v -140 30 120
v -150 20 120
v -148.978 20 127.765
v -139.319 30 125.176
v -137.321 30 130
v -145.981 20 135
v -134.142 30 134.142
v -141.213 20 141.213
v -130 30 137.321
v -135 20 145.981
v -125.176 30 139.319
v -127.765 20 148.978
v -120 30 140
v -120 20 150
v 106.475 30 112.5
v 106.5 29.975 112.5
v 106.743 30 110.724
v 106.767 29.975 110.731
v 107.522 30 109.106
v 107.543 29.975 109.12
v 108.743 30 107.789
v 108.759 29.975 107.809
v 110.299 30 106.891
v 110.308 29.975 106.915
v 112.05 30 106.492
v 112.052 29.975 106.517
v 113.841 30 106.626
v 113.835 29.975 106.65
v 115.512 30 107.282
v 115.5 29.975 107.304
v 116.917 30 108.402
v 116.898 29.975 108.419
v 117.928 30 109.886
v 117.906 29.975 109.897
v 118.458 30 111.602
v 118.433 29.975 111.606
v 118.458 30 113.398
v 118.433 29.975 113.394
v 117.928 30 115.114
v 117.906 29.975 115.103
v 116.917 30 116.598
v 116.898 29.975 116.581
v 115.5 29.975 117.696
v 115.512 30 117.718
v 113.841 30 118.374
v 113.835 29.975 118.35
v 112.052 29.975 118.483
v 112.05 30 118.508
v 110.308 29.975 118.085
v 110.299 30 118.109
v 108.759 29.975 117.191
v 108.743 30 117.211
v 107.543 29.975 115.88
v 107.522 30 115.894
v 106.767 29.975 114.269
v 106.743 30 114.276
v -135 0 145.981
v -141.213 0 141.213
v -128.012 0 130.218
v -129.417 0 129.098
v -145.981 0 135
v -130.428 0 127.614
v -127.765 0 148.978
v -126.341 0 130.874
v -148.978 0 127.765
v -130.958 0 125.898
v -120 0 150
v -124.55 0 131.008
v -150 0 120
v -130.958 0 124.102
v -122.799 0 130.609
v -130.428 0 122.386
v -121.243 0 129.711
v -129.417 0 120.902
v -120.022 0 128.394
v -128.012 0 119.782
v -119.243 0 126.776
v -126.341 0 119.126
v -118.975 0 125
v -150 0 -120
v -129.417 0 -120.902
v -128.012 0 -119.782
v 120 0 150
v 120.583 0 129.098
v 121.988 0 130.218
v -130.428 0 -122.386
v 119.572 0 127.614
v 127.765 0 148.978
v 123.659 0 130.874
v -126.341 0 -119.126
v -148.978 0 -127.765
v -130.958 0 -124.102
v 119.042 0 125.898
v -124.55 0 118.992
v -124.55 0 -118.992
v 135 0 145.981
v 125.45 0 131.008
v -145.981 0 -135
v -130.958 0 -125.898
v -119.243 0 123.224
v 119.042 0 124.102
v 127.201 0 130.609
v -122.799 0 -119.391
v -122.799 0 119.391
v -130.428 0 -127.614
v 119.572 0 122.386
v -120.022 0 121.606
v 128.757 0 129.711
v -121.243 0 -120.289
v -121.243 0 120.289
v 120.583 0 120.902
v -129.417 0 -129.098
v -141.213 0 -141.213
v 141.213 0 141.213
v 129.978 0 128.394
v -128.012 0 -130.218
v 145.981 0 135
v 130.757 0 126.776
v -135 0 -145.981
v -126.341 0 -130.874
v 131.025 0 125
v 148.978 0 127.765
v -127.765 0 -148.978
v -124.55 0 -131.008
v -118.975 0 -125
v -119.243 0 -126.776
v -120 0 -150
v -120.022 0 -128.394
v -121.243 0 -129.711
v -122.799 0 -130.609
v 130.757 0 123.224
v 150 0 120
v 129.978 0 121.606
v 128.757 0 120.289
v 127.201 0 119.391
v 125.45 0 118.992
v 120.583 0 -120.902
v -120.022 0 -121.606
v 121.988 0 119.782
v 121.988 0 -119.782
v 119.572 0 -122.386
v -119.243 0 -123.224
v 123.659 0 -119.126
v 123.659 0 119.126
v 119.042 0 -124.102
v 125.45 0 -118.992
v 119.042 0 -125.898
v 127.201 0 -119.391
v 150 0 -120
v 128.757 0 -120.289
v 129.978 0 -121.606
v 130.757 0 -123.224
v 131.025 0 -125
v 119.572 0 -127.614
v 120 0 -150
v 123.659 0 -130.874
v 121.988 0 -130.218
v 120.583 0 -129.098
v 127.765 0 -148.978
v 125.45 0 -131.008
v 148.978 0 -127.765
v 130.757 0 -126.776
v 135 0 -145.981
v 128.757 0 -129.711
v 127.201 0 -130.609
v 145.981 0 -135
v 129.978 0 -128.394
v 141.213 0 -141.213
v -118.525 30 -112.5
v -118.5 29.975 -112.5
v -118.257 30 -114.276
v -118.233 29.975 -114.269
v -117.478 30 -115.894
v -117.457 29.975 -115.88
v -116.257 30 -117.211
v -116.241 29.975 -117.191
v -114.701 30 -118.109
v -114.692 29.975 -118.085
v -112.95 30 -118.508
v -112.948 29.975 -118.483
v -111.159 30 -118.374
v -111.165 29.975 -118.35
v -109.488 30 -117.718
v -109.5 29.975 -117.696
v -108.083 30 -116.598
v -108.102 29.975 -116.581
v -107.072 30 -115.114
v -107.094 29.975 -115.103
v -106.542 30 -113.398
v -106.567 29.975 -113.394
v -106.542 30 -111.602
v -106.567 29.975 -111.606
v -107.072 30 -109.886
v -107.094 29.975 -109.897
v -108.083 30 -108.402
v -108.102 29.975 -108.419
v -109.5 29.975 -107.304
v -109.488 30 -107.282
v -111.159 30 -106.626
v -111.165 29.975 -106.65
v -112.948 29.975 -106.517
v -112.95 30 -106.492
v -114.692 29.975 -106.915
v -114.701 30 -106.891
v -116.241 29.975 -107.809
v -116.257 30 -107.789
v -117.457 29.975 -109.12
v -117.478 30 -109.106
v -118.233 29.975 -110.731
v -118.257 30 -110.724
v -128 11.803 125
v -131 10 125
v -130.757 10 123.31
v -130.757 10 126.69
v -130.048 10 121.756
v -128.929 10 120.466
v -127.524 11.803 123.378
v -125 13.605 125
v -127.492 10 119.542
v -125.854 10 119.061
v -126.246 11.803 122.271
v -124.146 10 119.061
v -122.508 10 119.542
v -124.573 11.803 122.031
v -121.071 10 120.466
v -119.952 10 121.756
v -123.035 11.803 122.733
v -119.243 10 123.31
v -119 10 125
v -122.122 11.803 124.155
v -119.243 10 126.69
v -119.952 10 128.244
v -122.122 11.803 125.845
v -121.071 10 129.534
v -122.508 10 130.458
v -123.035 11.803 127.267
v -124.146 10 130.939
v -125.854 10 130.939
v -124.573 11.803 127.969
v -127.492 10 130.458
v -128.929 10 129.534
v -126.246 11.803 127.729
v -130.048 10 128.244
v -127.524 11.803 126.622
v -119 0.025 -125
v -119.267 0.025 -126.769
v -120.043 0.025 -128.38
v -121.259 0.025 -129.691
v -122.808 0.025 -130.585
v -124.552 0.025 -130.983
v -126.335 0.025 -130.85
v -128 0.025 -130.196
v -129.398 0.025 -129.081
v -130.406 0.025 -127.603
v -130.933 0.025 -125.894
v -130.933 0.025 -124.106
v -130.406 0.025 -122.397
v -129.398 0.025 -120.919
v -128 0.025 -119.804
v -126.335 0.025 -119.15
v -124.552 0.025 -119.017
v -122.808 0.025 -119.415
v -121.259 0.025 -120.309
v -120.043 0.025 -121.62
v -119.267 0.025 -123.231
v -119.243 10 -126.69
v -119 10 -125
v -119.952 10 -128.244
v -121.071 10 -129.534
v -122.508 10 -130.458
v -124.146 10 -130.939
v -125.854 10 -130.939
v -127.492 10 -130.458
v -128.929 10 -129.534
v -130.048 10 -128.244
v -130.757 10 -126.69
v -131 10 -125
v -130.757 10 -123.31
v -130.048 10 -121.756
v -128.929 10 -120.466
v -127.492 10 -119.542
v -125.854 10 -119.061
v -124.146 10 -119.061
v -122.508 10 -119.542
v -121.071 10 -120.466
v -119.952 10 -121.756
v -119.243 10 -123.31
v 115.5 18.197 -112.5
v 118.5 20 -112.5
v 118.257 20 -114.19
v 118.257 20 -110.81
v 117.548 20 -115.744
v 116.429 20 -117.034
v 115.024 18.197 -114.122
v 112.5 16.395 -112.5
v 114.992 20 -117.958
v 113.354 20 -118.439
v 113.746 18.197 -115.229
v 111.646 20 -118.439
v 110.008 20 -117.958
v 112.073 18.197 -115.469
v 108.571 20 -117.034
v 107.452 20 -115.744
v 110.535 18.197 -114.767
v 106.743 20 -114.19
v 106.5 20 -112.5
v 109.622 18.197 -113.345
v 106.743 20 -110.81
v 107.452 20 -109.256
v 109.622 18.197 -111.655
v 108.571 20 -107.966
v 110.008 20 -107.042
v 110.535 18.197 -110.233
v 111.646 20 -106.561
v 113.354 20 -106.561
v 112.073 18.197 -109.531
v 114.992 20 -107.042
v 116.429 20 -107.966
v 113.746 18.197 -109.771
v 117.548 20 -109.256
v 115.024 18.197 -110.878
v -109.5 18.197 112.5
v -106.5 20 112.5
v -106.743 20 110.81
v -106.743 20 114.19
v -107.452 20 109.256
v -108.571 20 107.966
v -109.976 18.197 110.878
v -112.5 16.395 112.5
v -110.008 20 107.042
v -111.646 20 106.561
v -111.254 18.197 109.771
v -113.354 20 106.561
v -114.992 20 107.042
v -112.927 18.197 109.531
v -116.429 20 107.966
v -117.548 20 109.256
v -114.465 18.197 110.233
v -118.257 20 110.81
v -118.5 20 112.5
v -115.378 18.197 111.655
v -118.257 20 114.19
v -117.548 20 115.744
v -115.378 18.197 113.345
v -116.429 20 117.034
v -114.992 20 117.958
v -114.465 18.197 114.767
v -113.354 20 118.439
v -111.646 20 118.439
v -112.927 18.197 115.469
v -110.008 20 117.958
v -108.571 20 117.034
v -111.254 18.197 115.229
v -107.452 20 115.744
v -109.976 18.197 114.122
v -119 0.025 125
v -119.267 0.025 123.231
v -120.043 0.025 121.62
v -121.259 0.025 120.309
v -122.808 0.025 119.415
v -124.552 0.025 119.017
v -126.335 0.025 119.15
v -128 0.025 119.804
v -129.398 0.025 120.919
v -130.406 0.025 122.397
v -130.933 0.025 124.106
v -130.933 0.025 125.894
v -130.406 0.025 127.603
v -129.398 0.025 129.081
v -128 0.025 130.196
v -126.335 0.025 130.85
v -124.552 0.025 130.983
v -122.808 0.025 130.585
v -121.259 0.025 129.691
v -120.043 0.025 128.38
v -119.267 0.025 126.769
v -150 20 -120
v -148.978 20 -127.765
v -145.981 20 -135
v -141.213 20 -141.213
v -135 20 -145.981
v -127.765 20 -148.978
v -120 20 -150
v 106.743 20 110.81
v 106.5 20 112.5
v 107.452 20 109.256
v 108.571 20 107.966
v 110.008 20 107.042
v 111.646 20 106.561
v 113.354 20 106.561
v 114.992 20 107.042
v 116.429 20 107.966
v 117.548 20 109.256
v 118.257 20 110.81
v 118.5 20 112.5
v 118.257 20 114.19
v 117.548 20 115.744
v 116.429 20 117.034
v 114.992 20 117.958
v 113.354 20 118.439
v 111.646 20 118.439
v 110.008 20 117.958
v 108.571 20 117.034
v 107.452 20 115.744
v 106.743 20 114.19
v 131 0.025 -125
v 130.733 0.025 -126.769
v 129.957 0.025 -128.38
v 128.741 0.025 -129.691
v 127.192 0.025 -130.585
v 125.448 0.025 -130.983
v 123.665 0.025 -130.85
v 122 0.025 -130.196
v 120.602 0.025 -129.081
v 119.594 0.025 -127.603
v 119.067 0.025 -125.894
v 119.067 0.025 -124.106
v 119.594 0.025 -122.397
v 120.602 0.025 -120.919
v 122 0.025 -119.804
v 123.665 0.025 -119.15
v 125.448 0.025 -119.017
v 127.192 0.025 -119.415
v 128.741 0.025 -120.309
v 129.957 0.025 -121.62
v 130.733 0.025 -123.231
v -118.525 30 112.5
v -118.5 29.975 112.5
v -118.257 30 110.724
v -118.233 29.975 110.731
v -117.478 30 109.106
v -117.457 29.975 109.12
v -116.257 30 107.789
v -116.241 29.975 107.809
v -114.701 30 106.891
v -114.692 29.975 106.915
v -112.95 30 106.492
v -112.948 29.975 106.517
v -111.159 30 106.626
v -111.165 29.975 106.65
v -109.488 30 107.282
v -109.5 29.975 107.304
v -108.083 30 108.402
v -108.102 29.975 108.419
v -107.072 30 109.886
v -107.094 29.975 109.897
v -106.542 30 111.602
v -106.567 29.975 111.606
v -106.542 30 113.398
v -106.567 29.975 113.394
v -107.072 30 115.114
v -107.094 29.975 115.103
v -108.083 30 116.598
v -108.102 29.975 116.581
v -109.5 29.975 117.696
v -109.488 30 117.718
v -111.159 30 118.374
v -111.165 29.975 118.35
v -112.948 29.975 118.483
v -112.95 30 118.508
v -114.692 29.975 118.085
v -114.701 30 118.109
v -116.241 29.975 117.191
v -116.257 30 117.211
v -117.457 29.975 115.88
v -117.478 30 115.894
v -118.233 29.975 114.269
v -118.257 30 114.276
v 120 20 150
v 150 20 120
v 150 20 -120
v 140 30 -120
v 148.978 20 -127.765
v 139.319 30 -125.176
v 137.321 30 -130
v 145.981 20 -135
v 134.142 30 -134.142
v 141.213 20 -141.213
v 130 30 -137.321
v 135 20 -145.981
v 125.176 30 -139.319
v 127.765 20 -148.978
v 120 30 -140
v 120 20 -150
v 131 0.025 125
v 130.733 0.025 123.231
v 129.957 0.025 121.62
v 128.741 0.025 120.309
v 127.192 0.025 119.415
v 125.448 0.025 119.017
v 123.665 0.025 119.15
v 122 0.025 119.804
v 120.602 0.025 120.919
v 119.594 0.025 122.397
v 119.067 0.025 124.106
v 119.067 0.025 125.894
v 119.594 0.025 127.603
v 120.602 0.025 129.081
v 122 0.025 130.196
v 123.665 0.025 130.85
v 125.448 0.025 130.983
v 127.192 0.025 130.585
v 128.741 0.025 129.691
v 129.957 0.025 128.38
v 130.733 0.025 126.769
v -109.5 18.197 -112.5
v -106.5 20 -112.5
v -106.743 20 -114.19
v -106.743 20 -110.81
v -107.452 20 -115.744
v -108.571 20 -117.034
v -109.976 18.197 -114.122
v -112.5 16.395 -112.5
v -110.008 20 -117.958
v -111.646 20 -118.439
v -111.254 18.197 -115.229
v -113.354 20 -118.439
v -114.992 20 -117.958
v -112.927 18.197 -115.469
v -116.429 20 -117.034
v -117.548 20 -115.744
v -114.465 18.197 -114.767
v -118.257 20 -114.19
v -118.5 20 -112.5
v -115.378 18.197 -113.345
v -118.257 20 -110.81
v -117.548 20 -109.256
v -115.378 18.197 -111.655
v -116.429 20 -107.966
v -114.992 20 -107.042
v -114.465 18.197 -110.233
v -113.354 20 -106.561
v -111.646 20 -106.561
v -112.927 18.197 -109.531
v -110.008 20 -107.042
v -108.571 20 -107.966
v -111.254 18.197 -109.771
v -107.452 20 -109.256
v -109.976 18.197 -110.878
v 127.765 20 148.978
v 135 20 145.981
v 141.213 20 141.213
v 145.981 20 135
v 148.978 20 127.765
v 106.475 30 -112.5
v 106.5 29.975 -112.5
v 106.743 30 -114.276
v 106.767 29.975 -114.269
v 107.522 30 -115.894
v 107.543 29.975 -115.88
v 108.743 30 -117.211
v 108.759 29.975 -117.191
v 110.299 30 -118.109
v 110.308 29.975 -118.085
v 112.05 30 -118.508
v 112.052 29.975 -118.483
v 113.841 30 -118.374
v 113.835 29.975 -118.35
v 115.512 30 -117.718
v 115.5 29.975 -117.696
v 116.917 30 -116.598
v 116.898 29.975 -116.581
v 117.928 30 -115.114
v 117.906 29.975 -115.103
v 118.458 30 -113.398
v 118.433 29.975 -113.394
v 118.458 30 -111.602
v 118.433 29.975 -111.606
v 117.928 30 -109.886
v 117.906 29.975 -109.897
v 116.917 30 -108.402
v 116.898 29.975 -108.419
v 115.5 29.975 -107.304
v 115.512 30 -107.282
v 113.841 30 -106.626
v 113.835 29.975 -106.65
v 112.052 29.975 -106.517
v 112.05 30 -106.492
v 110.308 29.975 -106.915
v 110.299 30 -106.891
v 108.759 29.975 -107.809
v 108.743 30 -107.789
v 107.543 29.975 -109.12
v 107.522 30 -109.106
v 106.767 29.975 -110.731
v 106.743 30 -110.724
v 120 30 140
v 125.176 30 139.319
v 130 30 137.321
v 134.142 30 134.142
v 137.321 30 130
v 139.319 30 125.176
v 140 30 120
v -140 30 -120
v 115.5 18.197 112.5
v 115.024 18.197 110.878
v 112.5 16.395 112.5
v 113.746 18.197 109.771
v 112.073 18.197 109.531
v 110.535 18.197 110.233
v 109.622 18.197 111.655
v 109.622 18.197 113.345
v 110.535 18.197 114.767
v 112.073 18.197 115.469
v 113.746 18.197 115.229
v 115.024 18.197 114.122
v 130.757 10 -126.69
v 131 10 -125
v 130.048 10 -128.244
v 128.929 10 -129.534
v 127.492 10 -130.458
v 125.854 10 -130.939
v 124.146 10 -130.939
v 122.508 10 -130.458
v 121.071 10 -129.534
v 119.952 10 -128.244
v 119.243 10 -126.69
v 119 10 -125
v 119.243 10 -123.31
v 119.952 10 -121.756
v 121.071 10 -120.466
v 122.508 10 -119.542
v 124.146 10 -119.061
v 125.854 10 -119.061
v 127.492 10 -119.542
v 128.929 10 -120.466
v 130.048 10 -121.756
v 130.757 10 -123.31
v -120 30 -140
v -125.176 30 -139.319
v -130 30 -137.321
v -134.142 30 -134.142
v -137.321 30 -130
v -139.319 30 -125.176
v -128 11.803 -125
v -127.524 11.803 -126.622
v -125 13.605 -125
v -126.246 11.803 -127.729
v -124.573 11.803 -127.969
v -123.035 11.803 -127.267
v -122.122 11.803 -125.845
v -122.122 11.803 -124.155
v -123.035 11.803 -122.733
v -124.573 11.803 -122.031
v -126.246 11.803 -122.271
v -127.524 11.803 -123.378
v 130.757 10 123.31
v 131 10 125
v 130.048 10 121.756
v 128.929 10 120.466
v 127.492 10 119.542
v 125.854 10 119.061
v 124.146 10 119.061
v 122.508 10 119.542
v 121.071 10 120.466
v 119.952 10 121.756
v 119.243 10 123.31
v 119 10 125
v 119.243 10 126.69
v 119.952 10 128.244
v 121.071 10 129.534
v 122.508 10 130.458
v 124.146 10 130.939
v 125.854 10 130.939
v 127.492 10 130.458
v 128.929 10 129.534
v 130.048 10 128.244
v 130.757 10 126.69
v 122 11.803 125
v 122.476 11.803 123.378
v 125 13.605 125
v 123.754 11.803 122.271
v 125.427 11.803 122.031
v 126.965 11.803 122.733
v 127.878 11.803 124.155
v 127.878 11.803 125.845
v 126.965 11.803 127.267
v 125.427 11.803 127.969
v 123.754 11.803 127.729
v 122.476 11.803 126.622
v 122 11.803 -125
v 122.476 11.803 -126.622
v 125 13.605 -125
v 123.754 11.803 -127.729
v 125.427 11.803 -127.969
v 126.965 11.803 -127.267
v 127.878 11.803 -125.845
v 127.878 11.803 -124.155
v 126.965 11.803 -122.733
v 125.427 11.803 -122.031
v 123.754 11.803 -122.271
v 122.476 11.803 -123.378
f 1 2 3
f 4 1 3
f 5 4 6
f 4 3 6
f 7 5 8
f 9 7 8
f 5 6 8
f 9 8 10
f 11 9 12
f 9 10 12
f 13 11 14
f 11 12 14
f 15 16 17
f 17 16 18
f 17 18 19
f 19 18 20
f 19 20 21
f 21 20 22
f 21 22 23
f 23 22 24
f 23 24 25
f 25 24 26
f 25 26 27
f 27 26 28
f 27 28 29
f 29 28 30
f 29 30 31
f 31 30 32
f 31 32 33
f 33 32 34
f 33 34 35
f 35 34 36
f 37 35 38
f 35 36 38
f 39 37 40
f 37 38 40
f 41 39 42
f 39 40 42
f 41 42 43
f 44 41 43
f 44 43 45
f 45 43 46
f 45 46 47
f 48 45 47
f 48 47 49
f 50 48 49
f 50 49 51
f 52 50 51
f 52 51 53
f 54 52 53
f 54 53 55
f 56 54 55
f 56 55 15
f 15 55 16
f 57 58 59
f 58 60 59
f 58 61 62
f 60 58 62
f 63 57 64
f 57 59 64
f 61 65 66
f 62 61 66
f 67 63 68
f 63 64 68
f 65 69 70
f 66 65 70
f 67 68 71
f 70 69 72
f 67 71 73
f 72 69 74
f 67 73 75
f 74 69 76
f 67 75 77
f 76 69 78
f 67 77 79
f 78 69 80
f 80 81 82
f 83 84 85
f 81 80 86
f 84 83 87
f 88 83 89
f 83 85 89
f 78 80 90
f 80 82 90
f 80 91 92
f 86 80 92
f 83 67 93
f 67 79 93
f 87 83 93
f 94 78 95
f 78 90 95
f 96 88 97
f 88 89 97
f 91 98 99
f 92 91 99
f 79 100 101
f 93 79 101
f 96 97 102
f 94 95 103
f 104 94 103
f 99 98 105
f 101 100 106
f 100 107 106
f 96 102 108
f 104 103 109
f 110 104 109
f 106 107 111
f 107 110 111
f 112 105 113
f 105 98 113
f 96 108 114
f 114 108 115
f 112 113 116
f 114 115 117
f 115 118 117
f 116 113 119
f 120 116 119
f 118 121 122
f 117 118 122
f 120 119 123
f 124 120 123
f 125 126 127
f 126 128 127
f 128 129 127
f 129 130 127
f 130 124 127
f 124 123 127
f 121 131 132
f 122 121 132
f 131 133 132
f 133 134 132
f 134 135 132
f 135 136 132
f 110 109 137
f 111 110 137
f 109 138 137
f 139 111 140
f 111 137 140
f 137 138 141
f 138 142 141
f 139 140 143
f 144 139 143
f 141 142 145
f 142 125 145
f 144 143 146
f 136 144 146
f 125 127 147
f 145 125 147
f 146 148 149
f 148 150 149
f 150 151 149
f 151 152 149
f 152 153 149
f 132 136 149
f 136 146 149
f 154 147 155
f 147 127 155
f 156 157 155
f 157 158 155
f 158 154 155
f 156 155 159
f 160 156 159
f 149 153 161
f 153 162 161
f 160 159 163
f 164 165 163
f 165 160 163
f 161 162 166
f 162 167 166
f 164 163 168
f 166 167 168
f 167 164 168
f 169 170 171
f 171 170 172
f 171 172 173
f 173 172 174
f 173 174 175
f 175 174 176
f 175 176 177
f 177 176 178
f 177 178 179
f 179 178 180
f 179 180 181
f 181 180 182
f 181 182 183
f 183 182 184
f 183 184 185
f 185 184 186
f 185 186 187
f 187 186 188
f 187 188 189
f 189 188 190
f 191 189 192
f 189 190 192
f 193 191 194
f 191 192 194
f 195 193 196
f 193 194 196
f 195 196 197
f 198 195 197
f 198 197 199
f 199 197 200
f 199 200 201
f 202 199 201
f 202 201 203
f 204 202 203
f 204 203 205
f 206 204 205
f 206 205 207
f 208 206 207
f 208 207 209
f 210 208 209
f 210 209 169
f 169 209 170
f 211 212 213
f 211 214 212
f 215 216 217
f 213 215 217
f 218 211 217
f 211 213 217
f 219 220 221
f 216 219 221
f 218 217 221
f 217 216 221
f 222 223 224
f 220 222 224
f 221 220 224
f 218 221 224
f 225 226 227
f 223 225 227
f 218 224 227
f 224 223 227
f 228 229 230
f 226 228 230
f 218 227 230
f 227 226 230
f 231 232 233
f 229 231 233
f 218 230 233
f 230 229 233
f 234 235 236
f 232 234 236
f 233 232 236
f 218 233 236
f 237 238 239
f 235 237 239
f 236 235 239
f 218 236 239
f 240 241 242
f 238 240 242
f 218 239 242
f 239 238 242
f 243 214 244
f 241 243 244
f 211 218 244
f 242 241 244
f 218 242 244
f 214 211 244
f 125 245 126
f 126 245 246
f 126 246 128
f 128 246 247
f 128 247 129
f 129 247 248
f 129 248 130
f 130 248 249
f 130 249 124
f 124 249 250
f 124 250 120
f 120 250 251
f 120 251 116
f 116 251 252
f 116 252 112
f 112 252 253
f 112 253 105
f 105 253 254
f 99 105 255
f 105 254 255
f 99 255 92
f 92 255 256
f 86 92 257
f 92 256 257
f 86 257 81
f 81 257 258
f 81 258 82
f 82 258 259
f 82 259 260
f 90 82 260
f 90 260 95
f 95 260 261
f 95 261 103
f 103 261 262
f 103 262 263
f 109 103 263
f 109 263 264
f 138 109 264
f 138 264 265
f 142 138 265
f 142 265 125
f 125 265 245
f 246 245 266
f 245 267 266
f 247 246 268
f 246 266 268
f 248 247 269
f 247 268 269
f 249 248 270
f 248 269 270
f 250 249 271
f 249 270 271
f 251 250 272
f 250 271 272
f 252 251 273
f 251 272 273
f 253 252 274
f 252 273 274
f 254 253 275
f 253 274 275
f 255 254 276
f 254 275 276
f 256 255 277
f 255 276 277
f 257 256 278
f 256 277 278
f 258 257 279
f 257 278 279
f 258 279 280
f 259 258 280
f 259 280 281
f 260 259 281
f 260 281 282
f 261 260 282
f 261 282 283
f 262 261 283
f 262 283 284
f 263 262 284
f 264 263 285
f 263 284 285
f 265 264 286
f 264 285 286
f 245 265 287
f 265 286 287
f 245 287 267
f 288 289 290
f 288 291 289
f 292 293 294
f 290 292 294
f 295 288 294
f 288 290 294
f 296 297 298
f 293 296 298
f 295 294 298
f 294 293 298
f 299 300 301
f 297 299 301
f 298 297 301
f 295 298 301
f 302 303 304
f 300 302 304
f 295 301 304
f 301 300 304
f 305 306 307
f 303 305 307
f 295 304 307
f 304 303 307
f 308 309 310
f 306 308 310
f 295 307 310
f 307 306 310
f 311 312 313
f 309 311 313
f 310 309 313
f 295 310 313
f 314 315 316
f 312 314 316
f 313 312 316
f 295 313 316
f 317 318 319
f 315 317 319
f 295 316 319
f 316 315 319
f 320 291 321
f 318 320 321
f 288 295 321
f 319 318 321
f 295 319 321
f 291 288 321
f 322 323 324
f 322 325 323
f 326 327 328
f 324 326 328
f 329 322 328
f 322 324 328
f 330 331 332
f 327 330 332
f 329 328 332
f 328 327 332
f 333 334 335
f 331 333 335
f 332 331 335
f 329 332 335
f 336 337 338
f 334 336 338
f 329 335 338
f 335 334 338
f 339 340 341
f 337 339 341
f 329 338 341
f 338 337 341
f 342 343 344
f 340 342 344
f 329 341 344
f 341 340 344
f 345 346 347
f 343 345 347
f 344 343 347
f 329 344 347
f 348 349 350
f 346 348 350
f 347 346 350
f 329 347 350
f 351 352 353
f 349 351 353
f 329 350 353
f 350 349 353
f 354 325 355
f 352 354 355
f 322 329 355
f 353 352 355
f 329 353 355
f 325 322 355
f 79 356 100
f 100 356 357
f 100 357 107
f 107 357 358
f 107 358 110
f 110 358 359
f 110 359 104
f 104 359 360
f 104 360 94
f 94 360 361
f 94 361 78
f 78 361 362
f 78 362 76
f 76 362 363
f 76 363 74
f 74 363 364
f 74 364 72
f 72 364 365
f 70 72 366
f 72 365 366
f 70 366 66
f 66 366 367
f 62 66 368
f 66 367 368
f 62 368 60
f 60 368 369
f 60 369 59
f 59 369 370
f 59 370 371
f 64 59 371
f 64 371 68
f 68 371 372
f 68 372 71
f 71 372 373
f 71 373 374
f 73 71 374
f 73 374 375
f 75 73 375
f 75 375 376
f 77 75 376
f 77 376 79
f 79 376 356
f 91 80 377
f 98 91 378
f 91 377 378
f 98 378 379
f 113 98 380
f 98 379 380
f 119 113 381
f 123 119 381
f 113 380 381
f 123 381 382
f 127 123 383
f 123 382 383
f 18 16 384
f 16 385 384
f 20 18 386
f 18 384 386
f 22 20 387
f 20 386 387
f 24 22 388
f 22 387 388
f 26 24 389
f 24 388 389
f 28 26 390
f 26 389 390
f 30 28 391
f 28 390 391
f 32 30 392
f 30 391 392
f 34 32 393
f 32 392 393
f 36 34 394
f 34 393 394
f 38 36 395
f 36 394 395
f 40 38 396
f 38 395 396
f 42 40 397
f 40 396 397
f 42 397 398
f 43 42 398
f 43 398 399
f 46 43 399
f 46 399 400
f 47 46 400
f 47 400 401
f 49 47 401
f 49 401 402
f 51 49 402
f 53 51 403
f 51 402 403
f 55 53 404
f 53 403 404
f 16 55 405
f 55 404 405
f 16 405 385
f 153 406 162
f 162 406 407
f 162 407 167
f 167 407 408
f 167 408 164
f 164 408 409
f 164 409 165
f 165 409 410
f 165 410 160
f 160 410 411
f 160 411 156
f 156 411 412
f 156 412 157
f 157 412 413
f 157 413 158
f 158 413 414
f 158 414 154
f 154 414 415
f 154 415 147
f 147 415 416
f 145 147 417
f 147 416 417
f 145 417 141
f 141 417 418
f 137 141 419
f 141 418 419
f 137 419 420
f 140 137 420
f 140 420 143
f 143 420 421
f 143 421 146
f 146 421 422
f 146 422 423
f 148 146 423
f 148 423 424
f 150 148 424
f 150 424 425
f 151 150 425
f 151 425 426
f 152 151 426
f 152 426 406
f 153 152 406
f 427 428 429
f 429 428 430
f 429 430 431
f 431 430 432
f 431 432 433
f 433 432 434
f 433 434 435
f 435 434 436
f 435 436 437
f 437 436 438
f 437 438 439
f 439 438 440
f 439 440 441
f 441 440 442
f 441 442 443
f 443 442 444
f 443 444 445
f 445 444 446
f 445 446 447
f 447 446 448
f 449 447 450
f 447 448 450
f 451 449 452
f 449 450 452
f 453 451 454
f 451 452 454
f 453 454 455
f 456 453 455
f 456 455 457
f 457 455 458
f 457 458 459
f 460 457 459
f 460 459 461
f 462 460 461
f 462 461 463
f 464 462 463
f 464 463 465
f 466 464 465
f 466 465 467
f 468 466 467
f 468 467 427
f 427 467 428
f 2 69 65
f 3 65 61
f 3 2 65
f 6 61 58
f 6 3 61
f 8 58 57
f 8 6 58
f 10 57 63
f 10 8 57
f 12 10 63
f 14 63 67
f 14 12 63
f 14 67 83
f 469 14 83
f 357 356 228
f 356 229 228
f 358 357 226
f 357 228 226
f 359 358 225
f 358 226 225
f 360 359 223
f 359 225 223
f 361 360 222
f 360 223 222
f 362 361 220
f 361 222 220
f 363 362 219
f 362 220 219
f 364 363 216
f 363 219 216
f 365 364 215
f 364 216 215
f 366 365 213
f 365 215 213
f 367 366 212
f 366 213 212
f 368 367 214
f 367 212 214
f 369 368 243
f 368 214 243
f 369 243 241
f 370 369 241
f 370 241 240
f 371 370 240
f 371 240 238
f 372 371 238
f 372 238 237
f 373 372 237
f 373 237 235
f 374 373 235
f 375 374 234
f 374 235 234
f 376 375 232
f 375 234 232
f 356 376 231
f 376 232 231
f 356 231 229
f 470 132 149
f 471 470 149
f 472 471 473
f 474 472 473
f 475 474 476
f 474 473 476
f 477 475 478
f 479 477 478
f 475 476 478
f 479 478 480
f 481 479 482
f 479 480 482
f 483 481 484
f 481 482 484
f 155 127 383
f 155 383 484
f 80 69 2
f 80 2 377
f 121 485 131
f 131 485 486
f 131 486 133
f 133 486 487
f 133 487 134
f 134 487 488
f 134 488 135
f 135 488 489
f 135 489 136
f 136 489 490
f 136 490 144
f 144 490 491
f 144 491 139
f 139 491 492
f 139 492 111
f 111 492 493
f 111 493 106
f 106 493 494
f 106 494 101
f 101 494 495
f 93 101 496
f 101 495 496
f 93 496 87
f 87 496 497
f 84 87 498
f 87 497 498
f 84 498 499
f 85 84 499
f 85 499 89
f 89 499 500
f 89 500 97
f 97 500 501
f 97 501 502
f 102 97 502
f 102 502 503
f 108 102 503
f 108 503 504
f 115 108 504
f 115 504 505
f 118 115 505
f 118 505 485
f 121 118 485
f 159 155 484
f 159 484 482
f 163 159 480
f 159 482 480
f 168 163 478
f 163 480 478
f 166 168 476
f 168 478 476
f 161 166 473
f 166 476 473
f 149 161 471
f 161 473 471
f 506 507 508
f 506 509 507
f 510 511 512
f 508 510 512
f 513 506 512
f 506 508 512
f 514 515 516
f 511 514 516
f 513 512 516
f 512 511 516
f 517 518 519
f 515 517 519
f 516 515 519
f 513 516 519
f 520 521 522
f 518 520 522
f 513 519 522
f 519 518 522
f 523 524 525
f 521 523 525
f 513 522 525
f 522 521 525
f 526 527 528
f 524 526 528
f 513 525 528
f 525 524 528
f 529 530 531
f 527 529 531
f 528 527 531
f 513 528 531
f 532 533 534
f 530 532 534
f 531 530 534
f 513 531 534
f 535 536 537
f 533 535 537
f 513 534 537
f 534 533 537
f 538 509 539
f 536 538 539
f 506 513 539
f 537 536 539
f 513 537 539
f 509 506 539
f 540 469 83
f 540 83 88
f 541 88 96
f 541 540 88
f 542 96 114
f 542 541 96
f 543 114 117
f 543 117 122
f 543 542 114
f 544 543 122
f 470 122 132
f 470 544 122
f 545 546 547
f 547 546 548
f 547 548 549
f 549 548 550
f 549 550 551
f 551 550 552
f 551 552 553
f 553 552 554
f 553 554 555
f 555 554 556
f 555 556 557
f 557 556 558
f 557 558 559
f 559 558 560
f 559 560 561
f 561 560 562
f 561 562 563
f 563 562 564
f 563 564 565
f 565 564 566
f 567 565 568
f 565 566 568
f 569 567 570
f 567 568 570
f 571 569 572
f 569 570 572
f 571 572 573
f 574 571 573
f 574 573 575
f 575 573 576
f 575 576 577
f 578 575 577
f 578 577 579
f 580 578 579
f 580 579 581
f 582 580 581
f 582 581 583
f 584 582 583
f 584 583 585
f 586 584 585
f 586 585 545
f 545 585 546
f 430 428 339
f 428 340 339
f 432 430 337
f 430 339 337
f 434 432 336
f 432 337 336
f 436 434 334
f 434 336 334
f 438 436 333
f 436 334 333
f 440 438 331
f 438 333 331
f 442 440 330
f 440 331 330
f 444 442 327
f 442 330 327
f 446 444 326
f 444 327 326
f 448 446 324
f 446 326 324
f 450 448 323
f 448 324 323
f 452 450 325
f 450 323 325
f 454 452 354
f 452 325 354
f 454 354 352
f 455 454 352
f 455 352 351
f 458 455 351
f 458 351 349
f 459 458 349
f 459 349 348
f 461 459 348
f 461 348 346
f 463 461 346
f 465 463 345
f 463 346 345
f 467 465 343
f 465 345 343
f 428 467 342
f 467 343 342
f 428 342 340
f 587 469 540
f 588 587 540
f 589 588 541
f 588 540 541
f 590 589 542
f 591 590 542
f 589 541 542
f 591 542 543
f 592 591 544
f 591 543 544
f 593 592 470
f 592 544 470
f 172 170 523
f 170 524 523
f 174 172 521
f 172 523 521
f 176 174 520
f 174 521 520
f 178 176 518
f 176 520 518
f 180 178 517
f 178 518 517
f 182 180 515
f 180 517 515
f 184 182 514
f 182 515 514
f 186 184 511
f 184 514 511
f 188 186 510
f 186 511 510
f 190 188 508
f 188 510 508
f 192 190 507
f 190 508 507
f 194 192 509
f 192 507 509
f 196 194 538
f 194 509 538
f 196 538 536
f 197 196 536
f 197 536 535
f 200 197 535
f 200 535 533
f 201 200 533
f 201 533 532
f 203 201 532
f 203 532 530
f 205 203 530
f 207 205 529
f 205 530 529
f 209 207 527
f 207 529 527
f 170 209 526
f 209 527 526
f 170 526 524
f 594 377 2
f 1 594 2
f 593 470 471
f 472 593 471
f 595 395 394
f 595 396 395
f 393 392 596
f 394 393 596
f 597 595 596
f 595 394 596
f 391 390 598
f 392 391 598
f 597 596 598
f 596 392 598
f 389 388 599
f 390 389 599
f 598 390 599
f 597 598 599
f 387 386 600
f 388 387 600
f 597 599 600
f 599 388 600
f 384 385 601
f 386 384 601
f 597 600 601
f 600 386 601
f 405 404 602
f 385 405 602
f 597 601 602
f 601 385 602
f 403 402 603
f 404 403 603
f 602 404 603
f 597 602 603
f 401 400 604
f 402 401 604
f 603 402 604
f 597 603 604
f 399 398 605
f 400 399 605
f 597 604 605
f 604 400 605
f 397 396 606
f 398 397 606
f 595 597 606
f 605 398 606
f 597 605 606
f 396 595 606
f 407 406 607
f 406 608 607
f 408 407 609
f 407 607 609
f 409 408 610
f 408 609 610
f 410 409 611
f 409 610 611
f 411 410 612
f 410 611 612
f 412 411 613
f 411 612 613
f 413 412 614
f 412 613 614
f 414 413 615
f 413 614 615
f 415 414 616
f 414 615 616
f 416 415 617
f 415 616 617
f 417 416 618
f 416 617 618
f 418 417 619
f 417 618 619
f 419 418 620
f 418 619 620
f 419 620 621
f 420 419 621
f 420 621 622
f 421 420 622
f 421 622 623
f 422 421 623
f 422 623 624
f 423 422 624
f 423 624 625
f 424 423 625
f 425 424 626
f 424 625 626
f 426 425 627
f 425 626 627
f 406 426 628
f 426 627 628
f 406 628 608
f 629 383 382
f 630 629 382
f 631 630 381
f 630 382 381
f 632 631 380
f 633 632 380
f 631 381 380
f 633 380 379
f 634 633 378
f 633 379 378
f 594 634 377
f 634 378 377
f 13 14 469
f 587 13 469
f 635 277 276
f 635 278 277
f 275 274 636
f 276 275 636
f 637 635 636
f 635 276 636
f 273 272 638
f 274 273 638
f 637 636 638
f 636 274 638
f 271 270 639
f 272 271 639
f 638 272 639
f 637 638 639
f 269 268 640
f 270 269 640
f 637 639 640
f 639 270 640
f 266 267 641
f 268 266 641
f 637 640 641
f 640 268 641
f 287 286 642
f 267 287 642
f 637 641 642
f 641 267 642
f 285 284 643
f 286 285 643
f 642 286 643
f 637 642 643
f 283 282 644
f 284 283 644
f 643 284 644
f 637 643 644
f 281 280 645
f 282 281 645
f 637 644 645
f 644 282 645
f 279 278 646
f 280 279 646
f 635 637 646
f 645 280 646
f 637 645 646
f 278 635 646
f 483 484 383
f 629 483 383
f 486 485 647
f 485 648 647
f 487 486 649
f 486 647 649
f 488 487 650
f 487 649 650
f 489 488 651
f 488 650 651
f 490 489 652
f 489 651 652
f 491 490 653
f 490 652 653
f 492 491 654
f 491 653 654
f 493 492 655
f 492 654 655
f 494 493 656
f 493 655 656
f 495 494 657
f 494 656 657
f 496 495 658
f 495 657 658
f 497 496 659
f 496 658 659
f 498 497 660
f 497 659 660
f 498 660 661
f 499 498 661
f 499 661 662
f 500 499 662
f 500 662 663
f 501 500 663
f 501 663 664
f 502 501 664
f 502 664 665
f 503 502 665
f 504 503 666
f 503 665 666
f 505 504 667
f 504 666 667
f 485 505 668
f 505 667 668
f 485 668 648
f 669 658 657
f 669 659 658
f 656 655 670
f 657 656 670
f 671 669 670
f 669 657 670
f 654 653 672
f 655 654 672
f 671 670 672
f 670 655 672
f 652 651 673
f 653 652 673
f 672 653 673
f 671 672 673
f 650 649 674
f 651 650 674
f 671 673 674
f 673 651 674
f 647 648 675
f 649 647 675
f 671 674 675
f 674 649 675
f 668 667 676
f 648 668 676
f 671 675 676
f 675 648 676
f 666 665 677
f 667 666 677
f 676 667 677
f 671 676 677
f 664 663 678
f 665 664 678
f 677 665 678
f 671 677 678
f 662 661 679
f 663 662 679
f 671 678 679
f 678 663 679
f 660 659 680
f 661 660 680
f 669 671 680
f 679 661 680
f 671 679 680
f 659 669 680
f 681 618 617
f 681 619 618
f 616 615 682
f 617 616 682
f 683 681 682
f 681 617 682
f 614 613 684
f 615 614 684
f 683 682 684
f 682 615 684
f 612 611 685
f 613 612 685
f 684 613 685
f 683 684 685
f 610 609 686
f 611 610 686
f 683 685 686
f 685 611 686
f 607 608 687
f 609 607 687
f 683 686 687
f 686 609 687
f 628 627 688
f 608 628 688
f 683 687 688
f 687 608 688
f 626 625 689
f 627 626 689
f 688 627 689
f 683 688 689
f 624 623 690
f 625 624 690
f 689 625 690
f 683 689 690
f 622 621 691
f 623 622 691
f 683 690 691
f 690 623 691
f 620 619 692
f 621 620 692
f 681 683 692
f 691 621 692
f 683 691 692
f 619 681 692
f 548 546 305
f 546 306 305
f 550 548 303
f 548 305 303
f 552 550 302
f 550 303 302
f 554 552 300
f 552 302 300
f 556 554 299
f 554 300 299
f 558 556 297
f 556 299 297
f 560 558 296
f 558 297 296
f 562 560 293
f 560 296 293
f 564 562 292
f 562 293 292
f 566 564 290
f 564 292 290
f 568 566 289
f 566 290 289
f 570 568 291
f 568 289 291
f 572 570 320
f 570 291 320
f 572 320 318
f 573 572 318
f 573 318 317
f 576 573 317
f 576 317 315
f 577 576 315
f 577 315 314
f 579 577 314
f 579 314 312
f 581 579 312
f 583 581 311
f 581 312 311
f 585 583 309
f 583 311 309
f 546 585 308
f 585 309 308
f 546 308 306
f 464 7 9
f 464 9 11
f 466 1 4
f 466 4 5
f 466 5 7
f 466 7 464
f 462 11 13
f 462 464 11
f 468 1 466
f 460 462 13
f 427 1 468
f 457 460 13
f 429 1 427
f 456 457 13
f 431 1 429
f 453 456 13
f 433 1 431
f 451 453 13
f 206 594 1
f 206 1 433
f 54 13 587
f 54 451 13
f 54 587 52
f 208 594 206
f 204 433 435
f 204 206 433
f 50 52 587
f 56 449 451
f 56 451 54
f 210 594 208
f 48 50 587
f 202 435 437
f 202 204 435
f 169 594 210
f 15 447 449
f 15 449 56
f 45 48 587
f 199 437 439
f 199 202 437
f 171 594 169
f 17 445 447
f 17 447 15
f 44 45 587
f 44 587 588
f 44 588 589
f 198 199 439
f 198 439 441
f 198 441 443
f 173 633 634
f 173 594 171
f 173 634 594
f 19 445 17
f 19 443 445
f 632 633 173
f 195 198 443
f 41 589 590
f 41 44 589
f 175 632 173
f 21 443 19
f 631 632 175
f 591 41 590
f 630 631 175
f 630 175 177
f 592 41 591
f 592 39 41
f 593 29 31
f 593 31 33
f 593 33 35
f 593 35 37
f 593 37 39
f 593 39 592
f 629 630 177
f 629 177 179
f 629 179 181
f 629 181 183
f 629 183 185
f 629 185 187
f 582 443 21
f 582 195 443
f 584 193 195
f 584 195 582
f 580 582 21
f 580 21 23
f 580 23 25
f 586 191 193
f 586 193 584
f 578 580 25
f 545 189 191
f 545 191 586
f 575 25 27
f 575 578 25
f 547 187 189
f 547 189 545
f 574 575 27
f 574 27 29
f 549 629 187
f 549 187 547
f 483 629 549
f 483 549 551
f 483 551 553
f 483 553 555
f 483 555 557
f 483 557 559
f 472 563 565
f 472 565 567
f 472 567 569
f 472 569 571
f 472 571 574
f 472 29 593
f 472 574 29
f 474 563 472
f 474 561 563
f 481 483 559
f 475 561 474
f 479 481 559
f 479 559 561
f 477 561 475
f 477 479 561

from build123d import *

# Parameters (mm, degrees)
SKETCH1_W                        = 300
SKETCH1_H                        = 300
BOSS_EXTRUDE1_DEPTH              = 30
F_12_0MM_DOWEL_HOLE2_D           = 12
F_12_0MM_DOWEL_HOLE2_DEPTH       = 10
F_12_0MM_DOWEL_HOLE2_CSINK_D     = 12.05
F_12_0MM_DOWEL_HOLE2_CSINK_ANGLE = 90
F_12_0MM_DOWEL_HOLE2_TIP         = 3.605163714
F_12_0MM_DOWEL_HOLE3_D           = 12
F_12_0MM_DOWEL_HOLE3_DEPTH       = 10
F_12_0MM_DOWEL_HOLE3_CSINK_D     = 12.05
F_12_0MM_DOWEL_HOLE3_CSINK_ANGLE = 90
F_12_0MM_DOWEL_HOLE3_TIP         = 3.605163714
FILLET1_R                        = 30
CHAMFER1_SIZE                    = 10


with BuildPart() as part:
    # Sketch1 → Boss-Extrude1 (new body)
    with BuildSketch(Plane(origin=(0, 0, 0), x_dir=(1, 0, 0), z_dir=(0, 1, 0))):
        Rectangle(SKETCH1_W, SKETCH1_H)
    extrude(amount=BOSS_EXTRUDE1_DEPTH)

    # Ø12.0mm Dowel Hole2
    with Locations(Plane(origin=(0, 30, 0), x_dir=(1, 0, 0), z_dir=(0, 1, 0))):
        with Locations((-112.5, 112.5), (112.5, 112.5), (112.5, -112.5), (-112.5, -112.5)):
            CounterSinkHole(F_12_0MM_DOWEL_HOLE2_D / 2, F_12_0MM_DOWEL_HOLE2_CSINK_D / 2, depth=F_12_0MM_DOWEL_HOLE2_DEPTH, counter_sink_angle=F_12_0MM_DOWEL_HOLE2_CSINK_ANGLE)
            with Locations((0, 0, -(F_12_0MM_DOWEL_HOLE2_DEPTH + F_12_0MM_DOWEL_HOLE2_TIP / 2))):  # 118° drill point
                Cone(0, F_12_0MM_DOWEL_HOLE2_D / 2, F_12_0MM_DOWEL_HOLE2_TIP, mode=Mode.SUBTRACT)

    # Ø12.0mm Dowel Hole3
    with Locations(Plane(origin=(0, 0, 0), x_dir=(-1, 0, 0), z_dir=(0, -1, 0))):
        with Locations((-125, 125), (125, 125), (125, -125), (-125, -125)):
            CounterSinkHole(F_12_0MM_DOWEL_HOLE3_D / 2, F_12_0MM_DOWEL_HOLE3_CSINK_D / 2, depth=F_12_0MM_DOWEL_HOLE3_DEPTH, counter_sink_angle=F_12_0MM_DOWEL_HOLE3_CSINK_ANGLE)
            with Locations((0, 0, -(F_12_0MM_DOWEL_HOLE3_DEPTH + F_12_0MM_DOWEL_HOLE3_TIP / 2))):  # 118° drill point
                Cone(0, F_12_0MM_DOWEL_HOLE3_D / 2, F_12_0MM_DOWEL_HOLE3_TIP, mode=Mode.SUBTRACT)

    # Fillet1
    fillet1_edges = [part.edges().sort_by_distance(p)[0] for p in [
        (150, 15, 150),
        (-150, 15, 150),
        (-150, 15, -150),
        (150, 15, -150),
    ]]
    fillet(fillet1_edges, radius=FILLET1_R)

    # Chamfer1
    chamfer1_edges = [part.edges().sort_by_distance(p)[0] for p in [
        (150, 30, 0),
        (0, 30, 150),
        (0, 30, -150),
        (-150, 30, 0),
        (-141.213203436, 30, 141.213203436),
        (141.213203436, 30, -141.213203436),
        (-141.213203436, 30, -141.213203436),
        (141.213203436, 30, 141.213203436),
    ]]
    chamfer(chamfer1_edges, length=CHAMFER1_SIZE)


solid = part.part
